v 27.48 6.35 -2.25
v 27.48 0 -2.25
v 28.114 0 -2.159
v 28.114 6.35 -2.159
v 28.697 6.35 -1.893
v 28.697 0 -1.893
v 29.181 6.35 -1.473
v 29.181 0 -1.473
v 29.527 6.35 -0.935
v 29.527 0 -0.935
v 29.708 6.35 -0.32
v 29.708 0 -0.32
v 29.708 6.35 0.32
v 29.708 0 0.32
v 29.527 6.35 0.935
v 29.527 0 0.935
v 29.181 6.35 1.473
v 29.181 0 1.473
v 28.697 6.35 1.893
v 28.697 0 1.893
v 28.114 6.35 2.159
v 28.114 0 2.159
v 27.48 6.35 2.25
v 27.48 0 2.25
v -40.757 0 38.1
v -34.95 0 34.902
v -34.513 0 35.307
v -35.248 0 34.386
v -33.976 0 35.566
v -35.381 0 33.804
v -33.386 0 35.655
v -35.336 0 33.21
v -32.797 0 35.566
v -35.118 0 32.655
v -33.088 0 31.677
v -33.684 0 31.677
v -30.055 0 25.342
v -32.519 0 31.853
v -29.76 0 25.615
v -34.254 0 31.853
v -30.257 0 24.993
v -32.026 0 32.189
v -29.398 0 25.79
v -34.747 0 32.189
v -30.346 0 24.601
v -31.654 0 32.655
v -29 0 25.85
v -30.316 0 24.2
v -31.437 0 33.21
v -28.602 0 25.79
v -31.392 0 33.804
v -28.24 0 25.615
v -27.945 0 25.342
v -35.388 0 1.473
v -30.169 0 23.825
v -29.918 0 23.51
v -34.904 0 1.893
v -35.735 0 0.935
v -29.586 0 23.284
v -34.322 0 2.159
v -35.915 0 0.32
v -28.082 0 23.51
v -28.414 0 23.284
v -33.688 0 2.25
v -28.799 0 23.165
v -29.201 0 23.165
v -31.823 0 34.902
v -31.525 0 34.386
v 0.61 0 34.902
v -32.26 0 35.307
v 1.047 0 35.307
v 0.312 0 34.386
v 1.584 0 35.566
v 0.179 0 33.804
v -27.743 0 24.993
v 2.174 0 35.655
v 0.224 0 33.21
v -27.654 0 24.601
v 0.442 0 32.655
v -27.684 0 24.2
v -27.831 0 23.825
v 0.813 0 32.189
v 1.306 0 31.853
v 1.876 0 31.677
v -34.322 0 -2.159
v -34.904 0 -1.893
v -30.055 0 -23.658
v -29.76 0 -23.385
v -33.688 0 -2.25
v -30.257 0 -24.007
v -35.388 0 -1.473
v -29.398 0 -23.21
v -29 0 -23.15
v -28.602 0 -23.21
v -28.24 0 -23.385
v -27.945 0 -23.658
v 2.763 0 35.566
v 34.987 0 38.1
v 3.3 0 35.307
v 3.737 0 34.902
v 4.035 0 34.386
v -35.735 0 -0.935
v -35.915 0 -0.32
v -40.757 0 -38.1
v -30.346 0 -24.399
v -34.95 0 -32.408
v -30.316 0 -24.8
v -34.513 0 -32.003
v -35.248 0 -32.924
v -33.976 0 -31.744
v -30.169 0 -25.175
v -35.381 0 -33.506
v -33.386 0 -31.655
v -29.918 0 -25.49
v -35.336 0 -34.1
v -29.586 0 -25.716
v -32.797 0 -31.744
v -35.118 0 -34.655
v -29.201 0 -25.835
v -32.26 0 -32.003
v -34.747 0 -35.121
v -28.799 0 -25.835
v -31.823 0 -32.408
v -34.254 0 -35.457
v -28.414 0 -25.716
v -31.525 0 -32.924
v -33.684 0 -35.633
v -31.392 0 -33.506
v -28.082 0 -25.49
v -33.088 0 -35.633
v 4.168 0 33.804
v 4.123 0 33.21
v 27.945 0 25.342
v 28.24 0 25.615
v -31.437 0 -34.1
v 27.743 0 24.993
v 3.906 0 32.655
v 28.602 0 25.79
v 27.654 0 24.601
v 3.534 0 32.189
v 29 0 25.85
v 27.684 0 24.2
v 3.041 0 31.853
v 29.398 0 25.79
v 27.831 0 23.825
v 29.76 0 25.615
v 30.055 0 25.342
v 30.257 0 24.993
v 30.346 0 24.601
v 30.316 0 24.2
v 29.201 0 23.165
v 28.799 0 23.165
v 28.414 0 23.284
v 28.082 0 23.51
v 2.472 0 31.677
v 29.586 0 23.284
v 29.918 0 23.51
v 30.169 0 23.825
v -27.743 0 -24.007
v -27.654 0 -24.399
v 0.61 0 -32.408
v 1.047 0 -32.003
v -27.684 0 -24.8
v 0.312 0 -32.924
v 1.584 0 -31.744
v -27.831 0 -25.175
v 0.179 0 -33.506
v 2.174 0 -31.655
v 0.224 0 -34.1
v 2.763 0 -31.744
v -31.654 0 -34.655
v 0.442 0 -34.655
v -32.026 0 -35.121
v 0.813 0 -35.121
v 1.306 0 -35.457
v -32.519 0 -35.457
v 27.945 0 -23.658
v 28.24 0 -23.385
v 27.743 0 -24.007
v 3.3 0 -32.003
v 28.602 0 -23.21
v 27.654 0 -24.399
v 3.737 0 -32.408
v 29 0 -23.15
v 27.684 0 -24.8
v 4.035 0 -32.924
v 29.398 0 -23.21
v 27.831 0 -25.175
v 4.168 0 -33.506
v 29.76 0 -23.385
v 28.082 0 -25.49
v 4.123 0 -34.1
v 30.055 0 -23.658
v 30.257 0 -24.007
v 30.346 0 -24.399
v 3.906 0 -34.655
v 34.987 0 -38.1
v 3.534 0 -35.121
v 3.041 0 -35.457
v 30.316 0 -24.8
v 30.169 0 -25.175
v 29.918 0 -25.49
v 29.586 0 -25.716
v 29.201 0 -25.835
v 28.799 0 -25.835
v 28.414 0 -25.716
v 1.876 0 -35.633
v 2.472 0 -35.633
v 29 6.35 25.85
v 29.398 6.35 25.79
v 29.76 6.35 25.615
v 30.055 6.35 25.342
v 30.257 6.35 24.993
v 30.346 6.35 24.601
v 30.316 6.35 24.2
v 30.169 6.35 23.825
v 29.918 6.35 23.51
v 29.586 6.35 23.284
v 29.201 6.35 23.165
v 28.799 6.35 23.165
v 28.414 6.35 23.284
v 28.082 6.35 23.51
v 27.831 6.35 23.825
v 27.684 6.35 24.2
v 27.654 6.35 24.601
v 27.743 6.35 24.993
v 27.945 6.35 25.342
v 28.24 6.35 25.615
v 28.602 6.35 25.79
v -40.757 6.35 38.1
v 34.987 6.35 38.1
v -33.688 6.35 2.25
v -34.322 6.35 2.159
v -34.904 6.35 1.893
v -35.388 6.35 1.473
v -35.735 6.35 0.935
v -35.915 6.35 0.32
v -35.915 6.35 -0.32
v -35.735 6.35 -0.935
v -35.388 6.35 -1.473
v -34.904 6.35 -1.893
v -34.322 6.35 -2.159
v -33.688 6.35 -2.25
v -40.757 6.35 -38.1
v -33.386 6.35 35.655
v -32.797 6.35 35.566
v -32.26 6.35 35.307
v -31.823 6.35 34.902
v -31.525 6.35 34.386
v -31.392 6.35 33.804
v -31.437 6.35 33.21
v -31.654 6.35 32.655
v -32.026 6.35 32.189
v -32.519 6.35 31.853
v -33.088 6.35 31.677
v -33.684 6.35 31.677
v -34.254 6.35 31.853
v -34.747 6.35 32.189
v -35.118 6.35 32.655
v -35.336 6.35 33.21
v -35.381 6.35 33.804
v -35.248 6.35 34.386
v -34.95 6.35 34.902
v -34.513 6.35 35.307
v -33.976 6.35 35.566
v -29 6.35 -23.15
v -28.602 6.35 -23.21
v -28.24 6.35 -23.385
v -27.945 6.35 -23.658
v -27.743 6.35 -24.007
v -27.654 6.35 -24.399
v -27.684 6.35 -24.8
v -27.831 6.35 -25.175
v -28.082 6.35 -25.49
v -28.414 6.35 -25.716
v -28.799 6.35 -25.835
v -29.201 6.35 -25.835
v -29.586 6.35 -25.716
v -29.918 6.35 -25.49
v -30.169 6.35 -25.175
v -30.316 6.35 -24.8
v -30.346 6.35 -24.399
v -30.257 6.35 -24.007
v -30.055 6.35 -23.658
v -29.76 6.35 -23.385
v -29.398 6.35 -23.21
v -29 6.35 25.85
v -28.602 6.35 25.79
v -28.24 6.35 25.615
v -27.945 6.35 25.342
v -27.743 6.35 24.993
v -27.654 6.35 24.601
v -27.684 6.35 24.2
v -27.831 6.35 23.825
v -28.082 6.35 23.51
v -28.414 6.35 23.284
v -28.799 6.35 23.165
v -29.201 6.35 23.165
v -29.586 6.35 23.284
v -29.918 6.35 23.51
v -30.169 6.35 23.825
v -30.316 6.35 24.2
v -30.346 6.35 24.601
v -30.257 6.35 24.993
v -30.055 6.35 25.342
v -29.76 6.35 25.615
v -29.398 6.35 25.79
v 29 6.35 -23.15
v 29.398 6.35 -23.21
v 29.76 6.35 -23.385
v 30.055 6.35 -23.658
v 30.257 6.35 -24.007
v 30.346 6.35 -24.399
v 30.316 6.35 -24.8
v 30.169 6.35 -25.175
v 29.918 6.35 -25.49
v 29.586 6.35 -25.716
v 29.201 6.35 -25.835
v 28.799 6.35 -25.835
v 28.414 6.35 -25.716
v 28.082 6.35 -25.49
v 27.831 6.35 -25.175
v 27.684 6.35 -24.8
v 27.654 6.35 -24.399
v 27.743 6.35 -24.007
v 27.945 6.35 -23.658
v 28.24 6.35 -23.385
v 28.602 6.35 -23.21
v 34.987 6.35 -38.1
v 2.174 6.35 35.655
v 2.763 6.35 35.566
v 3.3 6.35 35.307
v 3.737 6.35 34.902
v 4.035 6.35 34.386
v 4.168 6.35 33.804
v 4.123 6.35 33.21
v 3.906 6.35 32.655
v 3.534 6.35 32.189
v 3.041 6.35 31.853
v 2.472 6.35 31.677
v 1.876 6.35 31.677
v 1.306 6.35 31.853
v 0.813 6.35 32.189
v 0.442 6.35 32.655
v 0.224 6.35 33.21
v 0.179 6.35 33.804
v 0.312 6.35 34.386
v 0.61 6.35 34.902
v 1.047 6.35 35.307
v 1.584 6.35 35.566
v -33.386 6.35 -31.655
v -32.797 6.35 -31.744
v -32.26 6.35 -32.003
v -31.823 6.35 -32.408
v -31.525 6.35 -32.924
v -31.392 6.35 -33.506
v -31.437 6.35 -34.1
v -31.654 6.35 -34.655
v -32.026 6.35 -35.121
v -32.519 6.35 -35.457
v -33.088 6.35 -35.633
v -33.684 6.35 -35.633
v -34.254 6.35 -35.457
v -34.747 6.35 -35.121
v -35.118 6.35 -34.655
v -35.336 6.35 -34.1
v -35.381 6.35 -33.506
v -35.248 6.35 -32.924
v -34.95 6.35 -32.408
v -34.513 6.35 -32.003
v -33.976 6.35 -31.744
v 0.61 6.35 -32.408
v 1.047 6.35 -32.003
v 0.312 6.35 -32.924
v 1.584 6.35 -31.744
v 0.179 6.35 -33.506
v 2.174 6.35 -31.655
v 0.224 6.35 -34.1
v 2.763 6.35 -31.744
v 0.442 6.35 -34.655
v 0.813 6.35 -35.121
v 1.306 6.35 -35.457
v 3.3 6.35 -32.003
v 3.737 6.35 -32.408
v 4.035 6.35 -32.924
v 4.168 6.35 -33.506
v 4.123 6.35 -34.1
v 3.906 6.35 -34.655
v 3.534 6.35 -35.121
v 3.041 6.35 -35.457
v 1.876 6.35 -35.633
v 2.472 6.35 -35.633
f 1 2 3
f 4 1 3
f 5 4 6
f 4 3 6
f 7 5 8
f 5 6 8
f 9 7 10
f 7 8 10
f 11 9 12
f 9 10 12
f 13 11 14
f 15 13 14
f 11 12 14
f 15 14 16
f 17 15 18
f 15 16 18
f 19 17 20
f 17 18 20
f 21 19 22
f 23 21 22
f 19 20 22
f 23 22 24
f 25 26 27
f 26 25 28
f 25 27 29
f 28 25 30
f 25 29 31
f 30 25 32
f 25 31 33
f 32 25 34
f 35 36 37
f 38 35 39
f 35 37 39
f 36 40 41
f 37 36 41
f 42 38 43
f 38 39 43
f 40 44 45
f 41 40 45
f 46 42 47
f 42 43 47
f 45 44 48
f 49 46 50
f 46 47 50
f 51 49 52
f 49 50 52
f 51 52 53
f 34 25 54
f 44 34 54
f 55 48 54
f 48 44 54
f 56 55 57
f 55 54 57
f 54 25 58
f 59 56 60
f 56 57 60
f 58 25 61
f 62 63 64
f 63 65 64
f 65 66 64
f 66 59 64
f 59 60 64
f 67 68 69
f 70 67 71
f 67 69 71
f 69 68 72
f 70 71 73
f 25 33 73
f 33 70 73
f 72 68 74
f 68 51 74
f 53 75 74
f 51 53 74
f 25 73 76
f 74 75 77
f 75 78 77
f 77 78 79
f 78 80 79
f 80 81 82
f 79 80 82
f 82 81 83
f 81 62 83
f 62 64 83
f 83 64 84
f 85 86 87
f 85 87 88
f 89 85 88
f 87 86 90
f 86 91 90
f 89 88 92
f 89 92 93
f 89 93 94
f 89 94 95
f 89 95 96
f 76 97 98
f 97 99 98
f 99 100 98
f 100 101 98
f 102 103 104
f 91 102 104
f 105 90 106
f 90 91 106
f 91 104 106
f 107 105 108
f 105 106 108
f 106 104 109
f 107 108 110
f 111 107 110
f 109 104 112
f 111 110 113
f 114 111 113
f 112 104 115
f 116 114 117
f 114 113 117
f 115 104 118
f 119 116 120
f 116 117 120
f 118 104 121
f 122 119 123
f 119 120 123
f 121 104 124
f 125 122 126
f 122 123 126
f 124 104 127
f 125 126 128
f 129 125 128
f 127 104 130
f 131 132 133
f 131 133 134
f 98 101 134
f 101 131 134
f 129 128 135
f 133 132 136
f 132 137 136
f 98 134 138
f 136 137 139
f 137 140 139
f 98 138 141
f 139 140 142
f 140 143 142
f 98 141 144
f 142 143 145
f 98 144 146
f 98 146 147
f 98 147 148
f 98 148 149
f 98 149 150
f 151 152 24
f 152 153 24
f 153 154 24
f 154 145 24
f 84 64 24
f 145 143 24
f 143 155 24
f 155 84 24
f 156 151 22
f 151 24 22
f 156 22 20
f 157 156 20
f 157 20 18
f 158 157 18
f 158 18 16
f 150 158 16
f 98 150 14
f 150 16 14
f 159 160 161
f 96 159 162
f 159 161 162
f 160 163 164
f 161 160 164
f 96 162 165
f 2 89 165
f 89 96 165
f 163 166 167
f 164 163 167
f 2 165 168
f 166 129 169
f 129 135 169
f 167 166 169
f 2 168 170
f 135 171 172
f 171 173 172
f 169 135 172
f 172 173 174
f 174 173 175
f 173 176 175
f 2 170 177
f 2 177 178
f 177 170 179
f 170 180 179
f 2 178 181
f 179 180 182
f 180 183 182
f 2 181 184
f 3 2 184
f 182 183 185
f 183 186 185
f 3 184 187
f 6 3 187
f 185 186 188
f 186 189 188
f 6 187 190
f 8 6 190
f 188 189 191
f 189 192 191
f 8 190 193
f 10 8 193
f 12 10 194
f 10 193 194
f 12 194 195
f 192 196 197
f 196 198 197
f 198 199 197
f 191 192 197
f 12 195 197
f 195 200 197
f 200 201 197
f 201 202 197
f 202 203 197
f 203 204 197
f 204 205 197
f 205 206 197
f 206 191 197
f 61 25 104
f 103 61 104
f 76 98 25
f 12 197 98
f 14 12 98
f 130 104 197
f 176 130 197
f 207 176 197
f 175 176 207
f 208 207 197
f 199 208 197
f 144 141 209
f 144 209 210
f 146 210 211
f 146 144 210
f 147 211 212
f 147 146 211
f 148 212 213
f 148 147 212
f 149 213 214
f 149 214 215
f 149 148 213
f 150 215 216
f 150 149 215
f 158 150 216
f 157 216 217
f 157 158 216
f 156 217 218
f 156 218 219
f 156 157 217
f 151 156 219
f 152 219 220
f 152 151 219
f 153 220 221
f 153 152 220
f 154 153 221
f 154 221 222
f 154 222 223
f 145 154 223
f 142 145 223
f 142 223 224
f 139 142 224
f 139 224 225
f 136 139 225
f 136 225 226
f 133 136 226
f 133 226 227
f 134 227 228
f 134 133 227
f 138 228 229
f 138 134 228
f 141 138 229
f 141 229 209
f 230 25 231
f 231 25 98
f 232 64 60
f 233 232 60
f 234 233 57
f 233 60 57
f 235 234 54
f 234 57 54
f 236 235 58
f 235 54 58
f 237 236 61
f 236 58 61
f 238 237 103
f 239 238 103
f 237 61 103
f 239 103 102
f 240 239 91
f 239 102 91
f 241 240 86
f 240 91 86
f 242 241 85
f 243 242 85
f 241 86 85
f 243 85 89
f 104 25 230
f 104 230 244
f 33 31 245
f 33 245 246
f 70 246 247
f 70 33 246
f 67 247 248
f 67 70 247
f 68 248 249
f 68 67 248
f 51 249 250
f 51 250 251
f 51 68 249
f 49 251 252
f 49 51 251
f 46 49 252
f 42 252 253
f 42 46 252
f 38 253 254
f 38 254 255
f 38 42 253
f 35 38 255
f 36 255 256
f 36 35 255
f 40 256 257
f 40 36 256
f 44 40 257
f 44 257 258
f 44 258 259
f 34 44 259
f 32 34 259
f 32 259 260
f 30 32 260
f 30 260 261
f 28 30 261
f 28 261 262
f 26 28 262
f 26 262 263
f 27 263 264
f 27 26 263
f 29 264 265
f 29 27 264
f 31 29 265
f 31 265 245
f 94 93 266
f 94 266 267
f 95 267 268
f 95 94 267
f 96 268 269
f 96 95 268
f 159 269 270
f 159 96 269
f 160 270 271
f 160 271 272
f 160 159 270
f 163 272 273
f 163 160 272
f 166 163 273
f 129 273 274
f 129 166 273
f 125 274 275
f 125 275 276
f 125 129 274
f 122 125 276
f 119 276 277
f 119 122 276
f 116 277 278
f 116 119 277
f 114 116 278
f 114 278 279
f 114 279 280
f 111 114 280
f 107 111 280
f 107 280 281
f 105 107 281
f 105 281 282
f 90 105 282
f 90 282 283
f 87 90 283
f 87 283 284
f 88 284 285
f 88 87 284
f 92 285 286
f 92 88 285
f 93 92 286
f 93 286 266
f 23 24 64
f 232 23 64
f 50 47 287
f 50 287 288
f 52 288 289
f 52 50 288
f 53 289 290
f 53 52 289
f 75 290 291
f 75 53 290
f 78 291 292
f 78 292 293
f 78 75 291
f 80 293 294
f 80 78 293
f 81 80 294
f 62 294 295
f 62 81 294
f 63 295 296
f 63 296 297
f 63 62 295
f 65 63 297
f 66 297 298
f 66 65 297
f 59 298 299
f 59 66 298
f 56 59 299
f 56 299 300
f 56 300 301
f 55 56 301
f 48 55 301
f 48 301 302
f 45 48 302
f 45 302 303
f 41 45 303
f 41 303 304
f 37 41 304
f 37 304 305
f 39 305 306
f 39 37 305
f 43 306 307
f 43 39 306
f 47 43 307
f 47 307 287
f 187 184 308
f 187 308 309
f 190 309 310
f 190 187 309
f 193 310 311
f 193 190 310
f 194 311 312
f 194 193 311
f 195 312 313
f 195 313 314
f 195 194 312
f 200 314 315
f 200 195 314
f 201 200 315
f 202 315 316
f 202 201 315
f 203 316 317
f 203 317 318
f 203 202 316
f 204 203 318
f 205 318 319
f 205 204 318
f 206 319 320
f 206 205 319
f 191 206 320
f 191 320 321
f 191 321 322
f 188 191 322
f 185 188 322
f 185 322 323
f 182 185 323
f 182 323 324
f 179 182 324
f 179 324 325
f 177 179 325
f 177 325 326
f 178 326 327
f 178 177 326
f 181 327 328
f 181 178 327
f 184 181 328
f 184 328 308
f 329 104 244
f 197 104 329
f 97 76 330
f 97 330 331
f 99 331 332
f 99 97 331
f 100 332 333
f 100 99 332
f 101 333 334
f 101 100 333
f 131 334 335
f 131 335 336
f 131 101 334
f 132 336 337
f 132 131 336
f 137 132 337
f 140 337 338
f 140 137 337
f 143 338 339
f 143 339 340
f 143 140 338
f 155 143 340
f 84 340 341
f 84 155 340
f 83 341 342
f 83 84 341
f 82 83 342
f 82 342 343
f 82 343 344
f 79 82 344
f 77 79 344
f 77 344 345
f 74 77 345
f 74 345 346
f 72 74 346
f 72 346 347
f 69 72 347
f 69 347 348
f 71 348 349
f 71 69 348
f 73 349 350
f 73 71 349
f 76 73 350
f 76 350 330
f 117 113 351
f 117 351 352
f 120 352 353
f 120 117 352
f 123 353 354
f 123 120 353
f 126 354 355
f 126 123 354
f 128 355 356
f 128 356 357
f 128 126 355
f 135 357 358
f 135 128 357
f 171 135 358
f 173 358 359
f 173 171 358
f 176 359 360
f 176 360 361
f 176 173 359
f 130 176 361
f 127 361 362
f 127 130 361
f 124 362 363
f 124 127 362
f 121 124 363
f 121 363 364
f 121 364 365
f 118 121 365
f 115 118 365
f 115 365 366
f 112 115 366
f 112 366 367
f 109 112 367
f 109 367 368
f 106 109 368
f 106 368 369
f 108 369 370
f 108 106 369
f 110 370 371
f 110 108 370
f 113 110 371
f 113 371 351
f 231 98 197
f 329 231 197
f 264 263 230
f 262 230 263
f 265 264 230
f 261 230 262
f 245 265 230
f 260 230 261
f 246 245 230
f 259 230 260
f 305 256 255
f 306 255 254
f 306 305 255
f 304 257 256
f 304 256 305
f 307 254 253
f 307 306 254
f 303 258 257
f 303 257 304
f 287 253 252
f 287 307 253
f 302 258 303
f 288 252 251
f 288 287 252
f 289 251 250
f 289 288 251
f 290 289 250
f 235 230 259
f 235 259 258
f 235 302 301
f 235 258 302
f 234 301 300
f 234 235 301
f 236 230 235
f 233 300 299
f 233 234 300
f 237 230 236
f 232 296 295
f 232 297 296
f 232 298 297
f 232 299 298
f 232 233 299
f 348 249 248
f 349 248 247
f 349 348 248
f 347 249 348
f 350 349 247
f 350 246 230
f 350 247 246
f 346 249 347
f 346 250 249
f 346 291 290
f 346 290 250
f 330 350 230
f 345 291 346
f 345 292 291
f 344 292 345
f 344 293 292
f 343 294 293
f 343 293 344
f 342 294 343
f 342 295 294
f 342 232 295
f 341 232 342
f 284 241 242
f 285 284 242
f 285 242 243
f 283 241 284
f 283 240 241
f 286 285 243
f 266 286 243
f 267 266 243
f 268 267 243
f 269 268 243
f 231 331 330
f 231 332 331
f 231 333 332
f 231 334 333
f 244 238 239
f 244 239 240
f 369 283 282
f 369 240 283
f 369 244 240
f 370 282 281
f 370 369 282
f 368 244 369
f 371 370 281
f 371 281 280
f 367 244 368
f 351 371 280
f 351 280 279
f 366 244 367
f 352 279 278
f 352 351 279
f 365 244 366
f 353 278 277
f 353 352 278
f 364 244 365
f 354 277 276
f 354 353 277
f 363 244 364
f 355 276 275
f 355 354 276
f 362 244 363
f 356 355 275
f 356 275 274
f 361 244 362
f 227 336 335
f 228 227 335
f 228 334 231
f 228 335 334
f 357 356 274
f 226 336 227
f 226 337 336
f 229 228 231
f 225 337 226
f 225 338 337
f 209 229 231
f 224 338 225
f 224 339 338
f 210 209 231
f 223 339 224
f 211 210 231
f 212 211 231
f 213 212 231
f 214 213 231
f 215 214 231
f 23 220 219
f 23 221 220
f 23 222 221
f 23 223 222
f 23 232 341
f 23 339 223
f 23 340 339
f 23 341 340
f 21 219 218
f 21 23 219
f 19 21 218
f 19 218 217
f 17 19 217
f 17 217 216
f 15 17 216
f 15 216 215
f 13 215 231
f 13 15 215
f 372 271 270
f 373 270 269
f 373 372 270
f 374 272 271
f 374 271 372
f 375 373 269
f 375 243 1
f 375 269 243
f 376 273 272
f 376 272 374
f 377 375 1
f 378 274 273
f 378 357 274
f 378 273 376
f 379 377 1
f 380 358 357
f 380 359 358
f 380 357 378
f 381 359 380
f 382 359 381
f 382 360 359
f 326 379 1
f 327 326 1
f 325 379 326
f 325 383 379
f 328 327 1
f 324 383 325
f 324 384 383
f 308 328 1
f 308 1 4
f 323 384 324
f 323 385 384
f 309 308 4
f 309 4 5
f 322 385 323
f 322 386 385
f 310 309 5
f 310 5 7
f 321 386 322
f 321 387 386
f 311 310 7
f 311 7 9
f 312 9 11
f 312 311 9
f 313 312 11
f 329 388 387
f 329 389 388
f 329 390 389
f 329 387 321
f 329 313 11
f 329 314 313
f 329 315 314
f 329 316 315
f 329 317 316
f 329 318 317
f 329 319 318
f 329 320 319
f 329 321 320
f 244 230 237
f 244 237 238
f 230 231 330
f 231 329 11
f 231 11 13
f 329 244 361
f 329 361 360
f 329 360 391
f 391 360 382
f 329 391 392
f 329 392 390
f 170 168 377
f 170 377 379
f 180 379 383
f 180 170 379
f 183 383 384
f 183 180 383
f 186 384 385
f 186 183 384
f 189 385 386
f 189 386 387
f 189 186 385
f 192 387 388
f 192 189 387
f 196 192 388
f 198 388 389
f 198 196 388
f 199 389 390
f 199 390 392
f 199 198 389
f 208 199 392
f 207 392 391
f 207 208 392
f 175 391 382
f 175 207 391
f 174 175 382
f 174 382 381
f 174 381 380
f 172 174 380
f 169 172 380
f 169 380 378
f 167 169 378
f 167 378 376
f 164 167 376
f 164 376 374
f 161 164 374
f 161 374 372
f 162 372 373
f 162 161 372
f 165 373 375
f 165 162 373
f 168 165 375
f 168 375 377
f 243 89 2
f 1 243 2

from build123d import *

# Parameters (mm, degrees)
SKETCH1_W           = 75.74480754
SKETCH1_H           = 76.2
SKETCH1_R           = 1.35
SKETCH1_R_2         = 1.999869
BOSS_EXTRUDE1_DEPTH = 6.35


with BuildPart() as part:
    # Sketch1 → Boss-Extrude1 (new body)
    with BuildSketch(Plane(origin=(0, 0, 0), x_dir=(1, 0, 0), z_dir=(0, 1, 0))):
        with Locations((-2.885014868, 0)):
            Rectangle(SKETCH1_W, SKETCH1_H)
        with Locations((-29, -24.5)):
            Circle(SKETCH1_R, mode=Mode.SUBTRACT)
        with Locations((29, -24.5)):
            Circle(SKETCH1_R, mode=Mode.SUBTRACT)
        with Locations((-29, 24.5)):
            Circle(SKETCH1_R, mode=Mode.SUBTRACT)
        with Locations((29, 24.5)):
            Circle(SKETCH1_R, mode=Mode.SUBTRACT)
        with Locations((-33.386335012, 33.655)):
            Circle(SKETCH1_R_2, mode=Mode.SUBTRACT)
        with Locations((-33.386335012, -33.655)):
            Circle(SKETCH1_R_2, mode=Mode.SUBTRACT)
        with Locations((2.173664988, 33.655)):
            Circle(SKETCH1_R_2, mode=Mode.SUBTRACT)
        with Locations((2.173664988, -33.655)):
            Circle(SKETCH1_R_2, mode=Mode.SUBTRACT)
        with BuildLine():
            Line((-33.68784786, 2.25), (27.48047437, 2.25))
            ThreePointArc((27.48047437, 2.25), (29.73047437, 0), (27.48047437, -2.25))
            Line((27.48047437, -2.25), (-33.68784786, -2.25))
            ThreePointArc((-33.68784786, -2.25), (-35.93784786, 0), (-33.68784786, 2.25))
        make_face(mode=Mode.SUBTRACT)
    extrude(amount=BOSS_EXTRUDE1_DEPTH)


solid = part.part
